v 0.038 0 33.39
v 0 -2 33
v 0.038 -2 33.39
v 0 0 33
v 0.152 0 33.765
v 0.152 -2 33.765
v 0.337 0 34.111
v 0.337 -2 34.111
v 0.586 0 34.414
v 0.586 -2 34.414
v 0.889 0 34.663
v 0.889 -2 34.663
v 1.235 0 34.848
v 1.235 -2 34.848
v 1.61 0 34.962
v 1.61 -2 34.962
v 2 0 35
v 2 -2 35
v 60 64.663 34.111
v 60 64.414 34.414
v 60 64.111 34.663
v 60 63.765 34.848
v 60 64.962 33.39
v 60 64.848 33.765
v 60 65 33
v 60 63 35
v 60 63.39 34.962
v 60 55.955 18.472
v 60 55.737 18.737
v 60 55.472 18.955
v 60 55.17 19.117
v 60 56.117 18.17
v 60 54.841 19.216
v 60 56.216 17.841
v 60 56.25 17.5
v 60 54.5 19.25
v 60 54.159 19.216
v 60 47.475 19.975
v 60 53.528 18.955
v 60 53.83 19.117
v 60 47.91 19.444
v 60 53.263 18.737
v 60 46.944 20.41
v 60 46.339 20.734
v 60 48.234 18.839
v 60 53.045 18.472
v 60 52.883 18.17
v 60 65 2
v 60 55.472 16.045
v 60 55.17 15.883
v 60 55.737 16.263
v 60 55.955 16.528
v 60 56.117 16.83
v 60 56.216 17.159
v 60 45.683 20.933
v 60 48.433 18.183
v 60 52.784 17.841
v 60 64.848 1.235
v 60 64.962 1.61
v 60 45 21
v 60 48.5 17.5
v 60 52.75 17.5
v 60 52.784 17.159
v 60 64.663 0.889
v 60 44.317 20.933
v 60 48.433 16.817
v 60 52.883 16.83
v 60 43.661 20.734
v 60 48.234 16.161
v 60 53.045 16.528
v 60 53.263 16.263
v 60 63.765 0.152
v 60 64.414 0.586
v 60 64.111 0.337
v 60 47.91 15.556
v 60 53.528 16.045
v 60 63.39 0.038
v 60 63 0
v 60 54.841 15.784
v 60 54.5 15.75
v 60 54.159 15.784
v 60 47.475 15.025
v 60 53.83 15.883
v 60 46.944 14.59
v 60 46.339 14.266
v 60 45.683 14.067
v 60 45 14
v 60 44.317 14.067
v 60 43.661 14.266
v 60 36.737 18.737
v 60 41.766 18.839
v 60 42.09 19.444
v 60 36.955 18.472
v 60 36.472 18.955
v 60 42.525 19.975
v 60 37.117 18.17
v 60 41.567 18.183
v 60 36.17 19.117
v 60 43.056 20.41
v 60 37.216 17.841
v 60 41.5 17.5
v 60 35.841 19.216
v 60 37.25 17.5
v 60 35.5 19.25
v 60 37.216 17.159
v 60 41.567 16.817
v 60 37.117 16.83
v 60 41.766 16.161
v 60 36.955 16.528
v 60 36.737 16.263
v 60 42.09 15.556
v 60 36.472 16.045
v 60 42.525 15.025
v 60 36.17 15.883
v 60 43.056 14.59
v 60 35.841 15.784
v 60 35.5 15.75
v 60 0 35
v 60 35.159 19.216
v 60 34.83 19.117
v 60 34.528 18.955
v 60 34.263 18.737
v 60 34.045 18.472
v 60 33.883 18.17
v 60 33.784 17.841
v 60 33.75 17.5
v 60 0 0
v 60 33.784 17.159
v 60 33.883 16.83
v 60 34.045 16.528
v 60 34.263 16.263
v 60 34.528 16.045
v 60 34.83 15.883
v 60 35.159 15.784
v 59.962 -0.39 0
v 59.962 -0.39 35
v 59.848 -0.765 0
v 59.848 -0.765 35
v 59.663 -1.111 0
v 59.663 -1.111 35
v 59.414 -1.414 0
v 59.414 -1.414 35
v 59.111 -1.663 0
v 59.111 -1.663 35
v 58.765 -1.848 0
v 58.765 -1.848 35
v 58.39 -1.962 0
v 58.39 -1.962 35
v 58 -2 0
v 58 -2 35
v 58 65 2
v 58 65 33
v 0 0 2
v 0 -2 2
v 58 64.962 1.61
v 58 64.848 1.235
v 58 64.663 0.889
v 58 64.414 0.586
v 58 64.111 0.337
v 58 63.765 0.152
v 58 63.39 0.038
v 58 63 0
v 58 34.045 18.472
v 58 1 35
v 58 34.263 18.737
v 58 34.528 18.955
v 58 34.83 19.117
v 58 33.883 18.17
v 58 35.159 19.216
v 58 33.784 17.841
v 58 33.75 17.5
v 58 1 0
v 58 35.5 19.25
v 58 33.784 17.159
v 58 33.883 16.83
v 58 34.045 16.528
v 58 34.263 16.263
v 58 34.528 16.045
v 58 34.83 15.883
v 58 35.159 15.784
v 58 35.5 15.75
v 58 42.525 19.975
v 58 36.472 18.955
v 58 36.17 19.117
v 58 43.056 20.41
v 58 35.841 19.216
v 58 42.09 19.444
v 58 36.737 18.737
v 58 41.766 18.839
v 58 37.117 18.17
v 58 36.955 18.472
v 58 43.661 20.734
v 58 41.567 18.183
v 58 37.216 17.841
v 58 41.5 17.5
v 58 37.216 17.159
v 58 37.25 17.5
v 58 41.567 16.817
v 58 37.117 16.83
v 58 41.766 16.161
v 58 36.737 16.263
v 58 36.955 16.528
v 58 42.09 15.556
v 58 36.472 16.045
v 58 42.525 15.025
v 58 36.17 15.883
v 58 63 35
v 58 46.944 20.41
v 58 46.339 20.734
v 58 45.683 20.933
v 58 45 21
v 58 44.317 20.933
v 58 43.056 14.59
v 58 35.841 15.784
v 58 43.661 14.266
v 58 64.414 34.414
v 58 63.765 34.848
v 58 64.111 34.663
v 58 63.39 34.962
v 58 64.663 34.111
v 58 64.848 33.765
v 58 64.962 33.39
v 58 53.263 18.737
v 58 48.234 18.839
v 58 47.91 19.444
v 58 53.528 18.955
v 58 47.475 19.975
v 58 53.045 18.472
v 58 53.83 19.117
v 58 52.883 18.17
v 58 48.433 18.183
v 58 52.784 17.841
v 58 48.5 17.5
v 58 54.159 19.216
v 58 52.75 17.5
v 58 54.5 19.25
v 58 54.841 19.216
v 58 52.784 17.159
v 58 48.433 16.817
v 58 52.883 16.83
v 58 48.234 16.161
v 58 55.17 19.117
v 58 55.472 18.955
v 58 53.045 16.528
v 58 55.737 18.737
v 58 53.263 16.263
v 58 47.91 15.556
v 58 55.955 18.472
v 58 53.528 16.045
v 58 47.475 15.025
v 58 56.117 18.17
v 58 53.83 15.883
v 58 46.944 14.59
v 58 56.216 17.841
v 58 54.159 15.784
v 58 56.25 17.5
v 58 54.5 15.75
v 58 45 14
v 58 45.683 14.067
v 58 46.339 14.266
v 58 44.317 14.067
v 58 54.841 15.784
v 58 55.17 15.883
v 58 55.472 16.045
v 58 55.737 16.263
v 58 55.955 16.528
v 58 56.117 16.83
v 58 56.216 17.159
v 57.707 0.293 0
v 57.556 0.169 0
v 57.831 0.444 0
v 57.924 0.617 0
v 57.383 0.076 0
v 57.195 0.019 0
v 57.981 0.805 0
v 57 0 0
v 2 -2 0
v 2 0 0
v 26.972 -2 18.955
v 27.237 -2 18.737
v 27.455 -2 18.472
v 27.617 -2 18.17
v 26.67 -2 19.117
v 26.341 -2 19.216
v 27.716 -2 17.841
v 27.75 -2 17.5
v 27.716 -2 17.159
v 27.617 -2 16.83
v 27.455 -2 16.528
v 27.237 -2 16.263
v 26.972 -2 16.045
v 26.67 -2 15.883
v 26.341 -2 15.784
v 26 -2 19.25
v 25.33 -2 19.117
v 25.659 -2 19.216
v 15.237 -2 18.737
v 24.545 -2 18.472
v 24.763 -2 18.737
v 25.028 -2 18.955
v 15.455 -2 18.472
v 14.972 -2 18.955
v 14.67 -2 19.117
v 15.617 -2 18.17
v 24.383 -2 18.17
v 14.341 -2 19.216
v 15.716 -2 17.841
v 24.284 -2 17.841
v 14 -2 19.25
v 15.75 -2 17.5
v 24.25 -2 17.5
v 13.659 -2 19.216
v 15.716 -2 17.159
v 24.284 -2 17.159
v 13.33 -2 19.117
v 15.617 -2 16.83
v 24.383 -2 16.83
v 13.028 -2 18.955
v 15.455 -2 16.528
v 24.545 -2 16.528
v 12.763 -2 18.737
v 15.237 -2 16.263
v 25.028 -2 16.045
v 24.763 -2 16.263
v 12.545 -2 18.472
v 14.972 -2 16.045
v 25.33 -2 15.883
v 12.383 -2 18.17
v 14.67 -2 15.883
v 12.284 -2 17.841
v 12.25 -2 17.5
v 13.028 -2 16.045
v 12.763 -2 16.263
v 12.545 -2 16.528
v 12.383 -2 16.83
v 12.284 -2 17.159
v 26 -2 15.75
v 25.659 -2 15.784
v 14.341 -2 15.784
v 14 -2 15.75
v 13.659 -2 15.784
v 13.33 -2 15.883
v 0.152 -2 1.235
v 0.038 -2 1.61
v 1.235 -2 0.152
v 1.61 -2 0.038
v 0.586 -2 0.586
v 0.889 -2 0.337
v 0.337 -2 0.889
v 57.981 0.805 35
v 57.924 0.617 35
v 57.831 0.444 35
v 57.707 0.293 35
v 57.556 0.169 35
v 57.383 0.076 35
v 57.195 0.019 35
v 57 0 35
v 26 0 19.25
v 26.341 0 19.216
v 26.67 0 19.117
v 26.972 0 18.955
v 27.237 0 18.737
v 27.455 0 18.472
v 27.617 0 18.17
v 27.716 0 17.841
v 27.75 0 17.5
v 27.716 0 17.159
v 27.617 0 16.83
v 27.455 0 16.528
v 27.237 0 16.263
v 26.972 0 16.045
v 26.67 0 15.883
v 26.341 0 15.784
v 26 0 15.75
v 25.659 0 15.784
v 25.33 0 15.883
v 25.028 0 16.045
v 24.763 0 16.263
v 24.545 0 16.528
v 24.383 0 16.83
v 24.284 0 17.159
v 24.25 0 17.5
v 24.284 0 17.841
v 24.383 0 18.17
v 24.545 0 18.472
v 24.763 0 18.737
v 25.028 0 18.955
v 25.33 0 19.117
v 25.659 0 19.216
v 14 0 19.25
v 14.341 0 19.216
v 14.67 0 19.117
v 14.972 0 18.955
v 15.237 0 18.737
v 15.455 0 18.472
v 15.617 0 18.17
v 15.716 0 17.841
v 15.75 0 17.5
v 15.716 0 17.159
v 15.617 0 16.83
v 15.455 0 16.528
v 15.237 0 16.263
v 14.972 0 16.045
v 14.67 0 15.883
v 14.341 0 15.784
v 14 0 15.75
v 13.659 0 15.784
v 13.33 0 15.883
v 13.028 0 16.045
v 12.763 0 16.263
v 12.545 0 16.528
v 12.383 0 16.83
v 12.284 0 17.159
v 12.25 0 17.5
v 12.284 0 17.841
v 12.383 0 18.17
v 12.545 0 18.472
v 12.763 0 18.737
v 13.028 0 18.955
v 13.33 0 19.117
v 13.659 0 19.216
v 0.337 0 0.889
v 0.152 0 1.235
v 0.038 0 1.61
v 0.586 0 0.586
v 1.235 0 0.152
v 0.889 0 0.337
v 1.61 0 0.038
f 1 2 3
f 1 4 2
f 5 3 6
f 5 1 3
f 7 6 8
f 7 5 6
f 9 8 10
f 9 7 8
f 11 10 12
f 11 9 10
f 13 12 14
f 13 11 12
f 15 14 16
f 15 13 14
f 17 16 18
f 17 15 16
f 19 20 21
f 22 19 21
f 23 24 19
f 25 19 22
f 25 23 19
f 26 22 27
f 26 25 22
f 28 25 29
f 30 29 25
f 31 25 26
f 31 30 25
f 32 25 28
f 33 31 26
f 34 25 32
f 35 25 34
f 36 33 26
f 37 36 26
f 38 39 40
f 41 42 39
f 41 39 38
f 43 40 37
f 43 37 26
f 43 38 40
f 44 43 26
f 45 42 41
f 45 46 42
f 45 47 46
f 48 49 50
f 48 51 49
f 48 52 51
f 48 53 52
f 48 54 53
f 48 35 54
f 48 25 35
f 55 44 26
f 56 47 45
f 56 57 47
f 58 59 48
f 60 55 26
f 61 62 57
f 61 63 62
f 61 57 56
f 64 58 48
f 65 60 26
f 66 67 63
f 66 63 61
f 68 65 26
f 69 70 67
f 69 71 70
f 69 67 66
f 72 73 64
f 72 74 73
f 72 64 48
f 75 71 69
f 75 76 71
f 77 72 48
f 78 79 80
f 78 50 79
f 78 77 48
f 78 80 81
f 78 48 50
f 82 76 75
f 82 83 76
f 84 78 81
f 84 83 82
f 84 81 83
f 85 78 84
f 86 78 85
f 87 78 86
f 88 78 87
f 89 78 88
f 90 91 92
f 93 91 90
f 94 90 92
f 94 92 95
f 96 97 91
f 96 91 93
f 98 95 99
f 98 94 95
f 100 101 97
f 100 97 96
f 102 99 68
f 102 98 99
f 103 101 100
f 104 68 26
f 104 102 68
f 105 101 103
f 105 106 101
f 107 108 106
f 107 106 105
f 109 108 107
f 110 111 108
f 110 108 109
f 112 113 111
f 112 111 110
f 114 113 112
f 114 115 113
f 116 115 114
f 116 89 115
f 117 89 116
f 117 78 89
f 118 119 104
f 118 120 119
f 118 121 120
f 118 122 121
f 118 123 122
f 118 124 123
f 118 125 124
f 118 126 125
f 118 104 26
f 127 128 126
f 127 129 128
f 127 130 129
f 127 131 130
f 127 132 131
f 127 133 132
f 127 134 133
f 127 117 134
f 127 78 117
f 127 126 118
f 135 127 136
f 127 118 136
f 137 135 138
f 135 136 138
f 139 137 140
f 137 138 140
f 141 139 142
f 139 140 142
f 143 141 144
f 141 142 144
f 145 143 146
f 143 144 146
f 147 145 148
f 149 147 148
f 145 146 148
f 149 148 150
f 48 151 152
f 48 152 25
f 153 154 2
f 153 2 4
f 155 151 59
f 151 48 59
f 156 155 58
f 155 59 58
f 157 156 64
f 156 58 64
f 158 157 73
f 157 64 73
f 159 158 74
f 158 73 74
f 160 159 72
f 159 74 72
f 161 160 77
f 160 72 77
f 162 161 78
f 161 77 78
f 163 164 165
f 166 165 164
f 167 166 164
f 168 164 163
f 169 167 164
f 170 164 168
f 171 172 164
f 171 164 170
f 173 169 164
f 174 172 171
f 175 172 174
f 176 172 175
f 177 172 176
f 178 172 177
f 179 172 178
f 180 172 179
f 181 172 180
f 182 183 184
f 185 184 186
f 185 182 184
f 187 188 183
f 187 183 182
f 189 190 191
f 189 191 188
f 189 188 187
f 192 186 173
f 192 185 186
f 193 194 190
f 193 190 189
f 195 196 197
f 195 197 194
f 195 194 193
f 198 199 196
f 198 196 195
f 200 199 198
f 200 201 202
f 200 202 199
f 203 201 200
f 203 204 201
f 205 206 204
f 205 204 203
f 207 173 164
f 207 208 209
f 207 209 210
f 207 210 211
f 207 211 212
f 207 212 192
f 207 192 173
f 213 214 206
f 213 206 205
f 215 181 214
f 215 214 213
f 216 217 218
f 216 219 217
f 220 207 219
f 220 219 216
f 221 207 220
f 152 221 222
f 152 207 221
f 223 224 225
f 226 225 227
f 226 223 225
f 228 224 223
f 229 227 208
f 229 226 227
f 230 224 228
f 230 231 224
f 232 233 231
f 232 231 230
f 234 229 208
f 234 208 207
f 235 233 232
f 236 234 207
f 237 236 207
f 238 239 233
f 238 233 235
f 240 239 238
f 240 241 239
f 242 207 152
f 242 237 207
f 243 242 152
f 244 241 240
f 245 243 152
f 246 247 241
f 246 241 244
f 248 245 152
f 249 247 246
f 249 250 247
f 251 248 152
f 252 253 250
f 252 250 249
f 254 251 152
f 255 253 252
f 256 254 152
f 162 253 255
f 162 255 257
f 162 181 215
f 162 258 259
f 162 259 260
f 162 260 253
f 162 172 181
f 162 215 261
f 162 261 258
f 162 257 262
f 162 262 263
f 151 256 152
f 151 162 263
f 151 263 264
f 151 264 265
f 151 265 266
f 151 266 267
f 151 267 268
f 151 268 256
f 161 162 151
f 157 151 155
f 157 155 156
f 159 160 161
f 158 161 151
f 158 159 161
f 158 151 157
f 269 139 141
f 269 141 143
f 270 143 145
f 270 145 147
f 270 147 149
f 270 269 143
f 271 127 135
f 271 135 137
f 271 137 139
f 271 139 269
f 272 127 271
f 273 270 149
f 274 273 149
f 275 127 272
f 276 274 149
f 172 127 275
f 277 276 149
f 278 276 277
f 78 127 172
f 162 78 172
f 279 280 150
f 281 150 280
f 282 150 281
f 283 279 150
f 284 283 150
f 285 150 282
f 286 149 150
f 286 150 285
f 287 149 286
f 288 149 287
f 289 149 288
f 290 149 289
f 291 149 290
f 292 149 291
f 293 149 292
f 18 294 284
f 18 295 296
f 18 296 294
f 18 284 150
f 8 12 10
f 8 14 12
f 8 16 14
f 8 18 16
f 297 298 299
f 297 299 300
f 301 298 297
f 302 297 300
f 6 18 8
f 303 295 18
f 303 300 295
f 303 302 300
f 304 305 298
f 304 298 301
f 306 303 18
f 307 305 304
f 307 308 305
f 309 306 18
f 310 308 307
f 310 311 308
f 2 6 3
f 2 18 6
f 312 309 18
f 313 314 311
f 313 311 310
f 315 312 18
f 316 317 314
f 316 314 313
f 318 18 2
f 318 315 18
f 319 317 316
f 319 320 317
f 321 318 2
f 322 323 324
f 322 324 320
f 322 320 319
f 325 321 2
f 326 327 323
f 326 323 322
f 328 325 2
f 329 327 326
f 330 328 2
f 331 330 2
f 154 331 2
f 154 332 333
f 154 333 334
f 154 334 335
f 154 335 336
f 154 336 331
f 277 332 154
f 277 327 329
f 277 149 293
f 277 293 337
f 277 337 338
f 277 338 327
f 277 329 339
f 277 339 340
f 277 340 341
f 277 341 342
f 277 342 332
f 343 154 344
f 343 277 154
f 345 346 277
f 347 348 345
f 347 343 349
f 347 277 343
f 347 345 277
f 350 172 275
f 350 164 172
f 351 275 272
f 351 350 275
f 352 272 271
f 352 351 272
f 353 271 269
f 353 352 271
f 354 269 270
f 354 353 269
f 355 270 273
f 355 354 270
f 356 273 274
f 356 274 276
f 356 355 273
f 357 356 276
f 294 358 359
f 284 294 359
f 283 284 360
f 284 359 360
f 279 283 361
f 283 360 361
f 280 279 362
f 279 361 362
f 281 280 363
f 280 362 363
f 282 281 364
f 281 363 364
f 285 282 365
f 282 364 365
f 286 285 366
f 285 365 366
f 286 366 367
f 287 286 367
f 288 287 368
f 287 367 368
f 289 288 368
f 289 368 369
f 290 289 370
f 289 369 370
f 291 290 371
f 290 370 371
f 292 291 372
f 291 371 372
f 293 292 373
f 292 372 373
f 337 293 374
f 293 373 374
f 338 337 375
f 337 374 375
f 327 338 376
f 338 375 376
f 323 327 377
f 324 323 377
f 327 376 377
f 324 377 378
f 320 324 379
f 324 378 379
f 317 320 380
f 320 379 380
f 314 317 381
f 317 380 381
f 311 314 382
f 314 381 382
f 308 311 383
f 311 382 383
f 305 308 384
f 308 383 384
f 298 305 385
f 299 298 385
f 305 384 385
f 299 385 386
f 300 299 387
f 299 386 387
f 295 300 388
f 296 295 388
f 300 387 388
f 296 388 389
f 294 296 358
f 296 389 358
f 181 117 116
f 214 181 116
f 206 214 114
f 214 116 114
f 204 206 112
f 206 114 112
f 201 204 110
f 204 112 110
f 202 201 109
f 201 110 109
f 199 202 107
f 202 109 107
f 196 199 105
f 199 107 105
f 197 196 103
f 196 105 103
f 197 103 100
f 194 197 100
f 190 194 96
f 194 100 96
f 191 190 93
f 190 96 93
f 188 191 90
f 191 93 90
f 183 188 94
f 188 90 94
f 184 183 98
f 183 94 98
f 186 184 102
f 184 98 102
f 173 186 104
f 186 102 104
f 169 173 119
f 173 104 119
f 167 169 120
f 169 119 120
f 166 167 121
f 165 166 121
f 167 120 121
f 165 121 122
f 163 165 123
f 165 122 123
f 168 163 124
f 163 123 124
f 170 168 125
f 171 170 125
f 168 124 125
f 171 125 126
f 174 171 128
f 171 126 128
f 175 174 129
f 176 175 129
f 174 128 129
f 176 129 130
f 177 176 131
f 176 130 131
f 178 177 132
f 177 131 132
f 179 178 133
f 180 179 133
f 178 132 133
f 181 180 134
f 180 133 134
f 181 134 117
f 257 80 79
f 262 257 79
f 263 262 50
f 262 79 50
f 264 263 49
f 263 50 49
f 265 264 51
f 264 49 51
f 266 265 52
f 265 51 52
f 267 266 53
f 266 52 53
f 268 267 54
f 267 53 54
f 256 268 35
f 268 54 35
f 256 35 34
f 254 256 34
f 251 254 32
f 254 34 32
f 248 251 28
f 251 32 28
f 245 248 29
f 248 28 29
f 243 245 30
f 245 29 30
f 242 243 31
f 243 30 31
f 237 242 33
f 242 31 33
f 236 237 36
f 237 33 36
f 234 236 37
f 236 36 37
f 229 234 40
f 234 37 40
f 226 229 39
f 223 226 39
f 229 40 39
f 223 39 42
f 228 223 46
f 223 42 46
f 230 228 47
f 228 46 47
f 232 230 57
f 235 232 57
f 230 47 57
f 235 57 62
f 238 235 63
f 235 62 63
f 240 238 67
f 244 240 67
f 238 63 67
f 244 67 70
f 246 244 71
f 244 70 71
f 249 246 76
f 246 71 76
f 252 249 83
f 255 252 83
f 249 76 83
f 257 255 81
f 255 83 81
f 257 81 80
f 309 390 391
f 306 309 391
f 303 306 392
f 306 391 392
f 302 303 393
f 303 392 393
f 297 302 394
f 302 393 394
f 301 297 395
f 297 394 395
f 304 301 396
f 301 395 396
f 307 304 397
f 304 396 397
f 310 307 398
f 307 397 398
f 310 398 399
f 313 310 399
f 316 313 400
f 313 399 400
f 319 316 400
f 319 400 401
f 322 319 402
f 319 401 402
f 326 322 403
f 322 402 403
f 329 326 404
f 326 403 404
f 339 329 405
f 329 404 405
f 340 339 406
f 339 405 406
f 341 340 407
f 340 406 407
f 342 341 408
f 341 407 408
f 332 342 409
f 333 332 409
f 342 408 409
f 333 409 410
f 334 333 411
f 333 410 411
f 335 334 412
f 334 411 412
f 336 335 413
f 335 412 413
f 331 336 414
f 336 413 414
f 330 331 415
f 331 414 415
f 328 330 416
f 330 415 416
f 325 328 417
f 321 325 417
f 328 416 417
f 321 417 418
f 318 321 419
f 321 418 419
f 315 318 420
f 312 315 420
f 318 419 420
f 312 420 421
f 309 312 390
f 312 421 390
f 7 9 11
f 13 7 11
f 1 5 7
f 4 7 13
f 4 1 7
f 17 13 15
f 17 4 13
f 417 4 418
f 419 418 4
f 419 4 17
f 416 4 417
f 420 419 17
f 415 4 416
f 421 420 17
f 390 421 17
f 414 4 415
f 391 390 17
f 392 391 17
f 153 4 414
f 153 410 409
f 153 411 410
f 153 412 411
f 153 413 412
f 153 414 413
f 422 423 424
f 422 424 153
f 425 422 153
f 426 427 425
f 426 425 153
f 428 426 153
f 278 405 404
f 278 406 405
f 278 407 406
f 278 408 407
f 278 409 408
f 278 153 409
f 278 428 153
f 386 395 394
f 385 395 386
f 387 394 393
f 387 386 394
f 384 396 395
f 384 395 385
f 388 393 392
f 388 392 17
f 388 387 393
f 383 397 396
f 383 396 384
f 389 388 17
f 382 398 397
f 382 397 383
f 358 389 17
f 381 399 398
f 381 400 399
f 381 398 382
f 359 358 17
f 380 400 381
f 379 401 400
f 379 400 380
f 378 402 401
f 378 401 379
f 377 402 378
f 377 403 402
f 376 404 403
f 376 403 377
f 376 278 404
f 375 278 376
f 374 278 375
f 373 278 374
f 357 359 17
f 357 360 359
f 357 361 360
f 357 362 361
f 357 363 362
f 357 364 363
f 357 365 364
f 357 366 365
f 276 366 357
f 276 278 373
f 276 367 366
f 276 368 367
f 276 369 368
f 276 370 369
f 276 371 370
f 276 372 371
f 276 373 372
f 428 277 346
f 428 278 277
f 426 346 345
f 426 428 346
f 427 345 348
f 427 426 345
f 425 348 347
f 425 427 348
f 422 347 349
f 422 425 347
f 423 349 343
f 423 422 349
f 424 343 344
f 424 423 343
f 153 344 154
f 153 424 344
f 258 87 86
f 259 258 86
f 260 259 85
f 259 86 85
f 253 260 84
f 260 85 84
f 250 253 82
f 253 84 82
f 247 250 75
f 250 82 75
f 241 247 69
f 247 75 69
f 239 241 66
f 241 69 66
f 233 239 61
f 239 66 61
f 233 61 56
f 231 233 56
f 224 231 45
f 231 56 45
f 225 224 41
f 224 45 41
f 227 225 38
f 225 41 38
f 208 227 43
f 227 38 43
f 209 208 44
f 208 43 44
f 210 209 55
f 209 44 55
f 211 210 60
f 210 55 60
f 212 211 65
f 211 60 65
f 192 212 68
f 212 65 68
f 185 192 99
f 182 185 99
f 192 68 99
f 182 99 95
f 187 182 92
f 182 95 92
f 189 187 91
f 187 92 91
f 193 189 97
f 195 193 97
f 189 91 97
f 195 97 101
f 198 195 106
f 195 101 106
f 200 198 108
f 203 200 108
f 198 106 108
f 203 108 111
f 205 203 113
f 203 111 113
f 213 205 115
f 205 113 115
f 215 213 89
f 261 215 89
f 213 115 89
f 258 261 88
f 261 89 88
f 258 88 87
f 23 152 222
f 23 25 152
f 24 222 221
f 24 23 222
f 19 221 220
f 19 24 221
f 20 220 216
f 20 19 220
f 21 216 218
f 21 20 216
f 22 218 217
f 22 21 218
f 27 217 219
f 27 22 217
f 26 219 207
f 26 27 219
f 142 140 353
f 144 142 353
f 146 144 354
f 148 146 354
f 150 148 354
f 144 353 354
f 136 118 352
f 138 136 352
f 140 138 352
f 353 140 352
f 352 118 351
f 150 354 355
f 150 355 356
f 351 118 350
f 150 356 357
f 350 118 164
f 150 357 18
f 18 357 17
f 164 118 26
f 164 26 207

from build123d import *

# Parameters (mm, degrees)
EXTRU_MINCE1_DEPTH      = 35
CONG_1_R                = 2
CONG_3_R                = 1
ESQUISSE3_R             = 1.75
ESQUISSE3_R_2           = 3.5
ENL_V_MAT_EXTRU_2_DEPTH = 2
CONG_5_R                = 2
CONG_6_R                = 2
CONG_7_R                = 2
CONG_8_R                = 2
ESQUISSE4_R             = 1.75
ENL_V_MAT_EXTRU_3_DEPTH = 2


with BuildPart() as part:
    # Esquisse1 → Extru.-Mince1 (new body)
    with BuildSketch(Plane.XY):
        Polygon((0, 0), (58, 0), (58, 65), (60, 65), (60, -2), (0, -2), align=None)
    extrude(amount=EXTRU_MINCE1_DEPTH)

    # Congé1
    cong_1_edges = [part.edges().sort_by_distance(p)[0] for p in [
        (60, -2, 17.5),
    ]]
    fillet(cong_1_edges, radius=CONG_1_R)

    # Congé3
    cong_3_edges = [part.edges().sort_by_distance(p)[0] for p in [
        (58, 0, 17.5),
    ]]
    fillet(cong_3_edges, radius=CONG_3_R)

    # Esquisse3 → Enlèv. mat.-Extru.2 (cut)
    with BuildSketch(Plane(origin=(60, 0, 0), x_dir=(0, 0, -1), z_dir=(1, 0, 0))):
        with Locations((-17.5, 35.5)):
            Circle(ESQUISSE3_R)
        with Locations((-17.5, 54.5)):
            Circle(ESQUISSE3_R)
        with Locations((-17.5, 45)):
            Circle(ESQUISSE3_R_2)
    extrude(amount=-ENL_V_MAT_EXTRU_2_DEPTH, mode=Mode.SUBTRACT)

    # Congé5
    cong_5_edges = [part.edges().sort_by_distance(p)[0] for p in [
        (59, 65, 35),
    ]]
    fillet(cong_5_edges, radius=CONG_5_R)

    # Congé6
    cong_6_edges = [part.edges().sort_by_distance(p)[0] for p in [
        (59, 65, 0),
    ]]
    fillet(cong_6_edges, radius=CONG_6_R)

    # Congé7
    cong_7_edges = [part.edges().sort_by_distance(p)[0] for p in [
        (0, -1, 0),
    ]]
    fillet(cong_7_edges, radius=CONG_7_R)

    # Congé8
    cong_8_edges = [part.edges().sort_by_distance(p)[0] for p in [
        (0, -1, 35),
    ]]
    fillet(cong_8_edges, radius=CONG_8_R)

    # Esquisse4 → Enlèv. mat.-Extru.3 (cut)
    with BuildSketch(Plane(origin=(0, 0, 0), x_dir=(1, 0, 0), z_dir=(0, 1, 0))):
        with Locations(Location((26, -17.5, 0), (0, 0, 270))):
            Circle(ESQUISSE4_R)
        with Locations(Location((14, -17.5, 0), (0, 0, 270))):
            Circle(ESQUISSE4_R)
    extrude(amount=-ENL_V_MAT_EXTRU_3_DEPTH, mode=Mode.SUBTRACT)


solid = part.part
